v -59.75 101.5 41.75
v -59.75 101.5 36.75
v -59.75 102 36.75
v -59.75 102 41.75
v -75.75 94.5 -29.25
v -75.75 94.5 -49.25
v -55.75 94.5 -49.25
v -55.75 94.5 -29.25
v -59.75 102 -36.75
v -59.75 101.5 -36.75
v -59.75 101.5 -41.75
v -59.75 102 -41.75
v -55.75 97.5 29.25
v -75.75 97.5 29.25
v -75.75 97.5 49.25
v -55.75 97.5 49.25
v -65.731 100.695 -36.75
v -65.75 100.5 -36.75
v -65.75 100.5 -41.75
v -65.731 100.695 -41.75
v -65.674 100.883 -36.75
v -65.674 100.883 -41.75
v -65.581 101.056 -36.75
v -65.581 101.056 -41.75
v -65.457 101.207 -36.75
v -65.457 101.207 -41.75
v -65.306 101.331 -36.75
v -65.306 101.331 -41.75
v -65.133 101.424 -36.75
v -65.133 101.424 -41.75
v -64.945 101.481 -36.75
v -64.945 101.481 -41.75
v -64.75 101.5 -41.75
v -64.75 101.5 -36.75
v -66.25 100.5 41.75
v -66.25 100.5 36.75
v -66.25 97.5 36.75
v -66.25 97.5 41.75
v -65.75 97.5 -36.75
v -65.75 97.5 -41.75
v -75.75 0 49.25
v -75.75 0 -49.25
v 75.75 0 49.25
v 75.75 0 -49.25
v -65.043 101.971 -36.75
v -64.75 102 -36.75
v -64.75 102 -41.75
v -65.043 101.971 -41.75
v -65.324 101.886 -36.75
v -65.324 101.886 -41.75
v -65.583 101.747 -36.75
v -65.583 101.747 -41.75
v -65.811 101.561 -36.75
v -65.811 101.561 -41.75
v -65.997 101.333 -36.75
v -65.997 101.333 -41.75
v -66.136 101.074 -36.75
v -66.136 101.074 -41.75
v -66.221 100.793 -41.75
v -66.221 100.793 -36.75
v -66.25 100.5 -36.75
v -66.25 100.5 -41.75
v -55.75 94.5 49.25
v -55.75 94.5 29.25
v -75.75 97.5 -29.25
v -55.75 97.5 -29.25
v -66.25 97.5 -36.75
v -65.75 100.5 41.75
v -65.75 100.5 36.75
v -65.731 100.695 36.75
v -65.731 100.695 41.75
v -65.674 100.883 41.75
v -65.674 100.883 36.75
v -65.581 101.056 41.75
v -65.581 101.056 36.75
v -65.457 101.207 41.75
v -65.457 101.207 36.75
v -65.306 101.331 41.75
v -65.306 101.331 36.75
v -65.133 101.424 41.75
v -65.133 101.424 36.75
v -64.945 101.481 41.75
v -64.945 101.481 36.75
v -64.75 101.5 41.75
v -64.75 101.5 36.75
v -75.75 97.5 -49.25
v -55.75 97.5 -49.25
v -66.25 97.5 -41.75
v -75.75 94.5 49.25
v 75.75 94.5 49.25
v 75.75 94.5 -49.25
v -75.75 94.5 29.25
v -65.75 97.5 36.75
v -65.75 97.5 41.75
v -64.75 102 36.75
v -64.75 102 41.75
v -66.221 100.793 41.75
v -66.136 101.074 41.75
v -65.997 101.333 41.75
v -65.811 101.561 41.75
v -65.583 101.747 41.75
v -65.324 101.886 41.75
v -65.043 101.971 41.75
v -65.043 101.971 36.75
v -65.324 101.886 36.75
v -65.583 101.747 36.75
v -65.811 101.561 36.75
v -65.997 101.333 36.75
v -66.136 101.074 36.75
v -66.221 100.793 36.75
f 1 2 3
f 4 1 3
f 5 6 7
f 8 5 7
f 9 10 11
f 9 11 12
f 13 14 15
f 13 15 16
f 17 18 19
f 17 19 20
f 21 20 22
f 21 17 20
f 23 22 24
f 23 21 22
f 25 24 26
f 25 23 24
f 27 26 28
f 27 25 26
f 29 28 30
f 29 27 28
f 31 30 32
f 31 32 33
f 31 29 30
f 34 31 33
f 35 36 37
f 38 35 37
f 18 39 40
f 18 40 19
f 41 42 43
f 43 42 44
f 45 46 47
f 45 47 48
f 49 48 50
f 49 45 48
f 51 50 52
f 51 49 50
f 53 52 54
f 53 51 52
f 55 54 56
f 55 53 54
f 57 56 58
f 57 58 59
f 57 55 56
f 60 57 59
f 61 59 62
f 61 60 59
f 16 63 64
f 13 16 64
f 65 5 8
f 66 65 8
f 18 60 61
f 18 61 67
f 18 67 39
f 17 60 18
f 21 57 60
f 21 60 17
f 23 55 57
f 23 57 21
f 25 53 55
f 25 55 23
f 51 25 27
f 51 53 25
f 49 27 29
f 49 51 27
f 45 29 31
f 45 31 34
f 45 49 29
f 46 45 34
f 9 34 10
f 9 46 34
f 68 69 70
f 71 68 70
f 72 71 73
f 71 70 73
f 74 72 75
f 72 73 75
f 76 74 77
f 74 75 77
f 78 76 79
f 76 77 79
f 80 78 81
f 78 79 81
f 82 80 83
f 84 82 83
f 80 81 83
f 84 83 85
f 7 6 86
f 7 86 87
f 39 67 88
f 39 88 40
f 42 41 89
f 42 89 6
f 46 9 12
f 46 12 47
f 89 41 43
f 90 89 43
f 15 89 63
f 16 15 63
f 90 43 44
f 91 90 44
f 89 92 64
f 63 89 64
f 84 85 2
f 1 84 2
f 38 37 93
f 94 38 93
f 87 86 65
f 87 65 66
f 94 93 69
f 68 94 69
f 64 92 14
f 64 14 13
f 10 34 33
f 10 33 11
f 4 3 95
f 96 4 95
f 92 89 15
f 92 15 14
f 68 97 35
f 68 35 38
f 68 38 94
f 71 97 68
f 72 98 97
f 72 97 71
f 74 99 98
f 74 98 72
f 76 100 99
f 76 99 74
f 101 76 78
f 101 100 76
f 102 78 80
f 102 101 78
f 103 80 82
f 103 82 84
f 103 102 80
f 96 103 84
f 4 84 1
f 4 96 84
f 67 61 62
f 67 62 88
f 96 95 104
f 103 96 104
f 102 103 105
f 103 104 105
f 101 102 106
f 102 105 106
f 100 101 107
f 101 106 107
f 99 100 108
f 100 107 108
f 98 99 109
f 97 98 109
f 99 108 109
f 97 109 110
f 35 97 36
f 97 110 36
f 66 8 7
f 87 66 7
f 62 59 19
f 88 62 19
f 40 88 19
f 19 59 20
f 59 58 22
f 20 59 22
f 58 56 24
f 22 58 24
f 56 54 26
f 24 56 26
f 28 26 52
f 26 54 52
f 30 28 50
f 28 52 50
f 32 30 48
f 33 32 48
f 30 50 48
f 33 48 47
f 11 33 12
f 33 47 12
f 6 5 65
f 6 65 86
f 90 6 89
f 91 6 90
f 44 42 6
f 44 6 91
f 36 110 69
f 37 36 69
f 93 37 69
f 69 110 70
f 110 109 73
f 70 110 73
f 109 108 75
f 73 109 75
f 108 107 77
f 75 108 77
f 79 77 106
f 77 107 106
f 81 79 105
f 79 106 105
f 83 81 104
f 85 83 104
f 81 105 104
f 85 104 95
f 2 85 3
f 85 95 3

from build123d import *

# Parameters (mm, degrees)
SKETCH1_W                = 151.5
SKETCH1_H                = 98.5
BOSS_EXTRUDE1_DEPTH      = 94.5
SKETCH2_W                = 20
SKETCH2_H                = 20
BOSS_EXTRUDE2_DEPTH      = 3
BOSS_EXTRUDE2_2_DEPTH    = 3
BOSS_EXTRUDE3_DEPTH      = 2.5
BOSS_EXTRUDE3_DEPTH_BACK = 2.5


with BuildPart() as part:
    # Sketch1 → Boss-Extrude1 (new body)
    with BuildSketch(Plane(origin=(0, 0, 0), x_dir=(1, 0, 0), z_dir=(0, 1, 0))):
        Rectangle(SKETCH1_W, SKETCH1_H)
    extrude(amount=BOSS_EXTRUDE1_DEPTH)


with BuildPart() as body_2:
    # Sketch2 → Boss-Extrude2 (new body)
    with BuildSketch(Plane(origin=(0, 94.5, 0), x_dir=(1, 0, 0), z_dir=(0, 1, 0))):
        with Locations((-65.75, 39.25)):
            Rectangle(SKETCH2_W, SKETCH2_H)
    extrude(amount=BOSS_EXTRUDE2_DEPTH)


with BuildPart() as body_3:
    # Sketch2 → Boss-Extrude2 2 (new body)
    with BuildSketch(Plane(origin=(0, 94.5, 0), x_dir=(1, 0, 0), z_dir=(0, 1, 0))):
        with Locations((-65.75, -39.25)):
            Rectangle(SKETCH2_W, SKETCH2_H)
    extrude(amount=BOSS_EXTRUDE2_2_DEPTH)


with BuildPart() as body_4:
    # Sketch3 → Boss-Extrude3 (new, two sides: drawn at the far end of the back side and taken through both)
    with BuildSketch(Plane.XY.offset(39.25).offset(-BOSS_EXTRUDE3_DEPTH_BACK)):
        with BuildLine():
            Line((-65.75, 97.5), (-65.75, 100.5))
            ThreePointArc((-65.75, 100.5), (-65.457106781, 101.207106781), (-64.75, 101.5))
            Line((-64.75, 101.5), (-59.75, 101.5))
            Line((-59.75, 101.5), (-59.75, 102))
            Line((-59.75, 102), (-64.75, 102))
            ThreePointArc((-64.75, 102), (-65.810660172, 101.560660172), (-66.25, 100.5))
            Line((-66.25, 100.5), (-66.25, 97.5))
            Line((-66.25, 97.5), (-65.75, 97.5))
        make_face()
    extrude(amount=BOSS_EXTRUDE3_DEPTH + BOSS_EXTRUDE3_DEPTH_BACK)


with BuildPart() as body_5:
    # Mirror2: mirrored copy
    add(body_4.part.mirror(Plane.XY))


solid = Compound([part.part, body_2.part, body_3.part, body_4.part, body_5.part])
